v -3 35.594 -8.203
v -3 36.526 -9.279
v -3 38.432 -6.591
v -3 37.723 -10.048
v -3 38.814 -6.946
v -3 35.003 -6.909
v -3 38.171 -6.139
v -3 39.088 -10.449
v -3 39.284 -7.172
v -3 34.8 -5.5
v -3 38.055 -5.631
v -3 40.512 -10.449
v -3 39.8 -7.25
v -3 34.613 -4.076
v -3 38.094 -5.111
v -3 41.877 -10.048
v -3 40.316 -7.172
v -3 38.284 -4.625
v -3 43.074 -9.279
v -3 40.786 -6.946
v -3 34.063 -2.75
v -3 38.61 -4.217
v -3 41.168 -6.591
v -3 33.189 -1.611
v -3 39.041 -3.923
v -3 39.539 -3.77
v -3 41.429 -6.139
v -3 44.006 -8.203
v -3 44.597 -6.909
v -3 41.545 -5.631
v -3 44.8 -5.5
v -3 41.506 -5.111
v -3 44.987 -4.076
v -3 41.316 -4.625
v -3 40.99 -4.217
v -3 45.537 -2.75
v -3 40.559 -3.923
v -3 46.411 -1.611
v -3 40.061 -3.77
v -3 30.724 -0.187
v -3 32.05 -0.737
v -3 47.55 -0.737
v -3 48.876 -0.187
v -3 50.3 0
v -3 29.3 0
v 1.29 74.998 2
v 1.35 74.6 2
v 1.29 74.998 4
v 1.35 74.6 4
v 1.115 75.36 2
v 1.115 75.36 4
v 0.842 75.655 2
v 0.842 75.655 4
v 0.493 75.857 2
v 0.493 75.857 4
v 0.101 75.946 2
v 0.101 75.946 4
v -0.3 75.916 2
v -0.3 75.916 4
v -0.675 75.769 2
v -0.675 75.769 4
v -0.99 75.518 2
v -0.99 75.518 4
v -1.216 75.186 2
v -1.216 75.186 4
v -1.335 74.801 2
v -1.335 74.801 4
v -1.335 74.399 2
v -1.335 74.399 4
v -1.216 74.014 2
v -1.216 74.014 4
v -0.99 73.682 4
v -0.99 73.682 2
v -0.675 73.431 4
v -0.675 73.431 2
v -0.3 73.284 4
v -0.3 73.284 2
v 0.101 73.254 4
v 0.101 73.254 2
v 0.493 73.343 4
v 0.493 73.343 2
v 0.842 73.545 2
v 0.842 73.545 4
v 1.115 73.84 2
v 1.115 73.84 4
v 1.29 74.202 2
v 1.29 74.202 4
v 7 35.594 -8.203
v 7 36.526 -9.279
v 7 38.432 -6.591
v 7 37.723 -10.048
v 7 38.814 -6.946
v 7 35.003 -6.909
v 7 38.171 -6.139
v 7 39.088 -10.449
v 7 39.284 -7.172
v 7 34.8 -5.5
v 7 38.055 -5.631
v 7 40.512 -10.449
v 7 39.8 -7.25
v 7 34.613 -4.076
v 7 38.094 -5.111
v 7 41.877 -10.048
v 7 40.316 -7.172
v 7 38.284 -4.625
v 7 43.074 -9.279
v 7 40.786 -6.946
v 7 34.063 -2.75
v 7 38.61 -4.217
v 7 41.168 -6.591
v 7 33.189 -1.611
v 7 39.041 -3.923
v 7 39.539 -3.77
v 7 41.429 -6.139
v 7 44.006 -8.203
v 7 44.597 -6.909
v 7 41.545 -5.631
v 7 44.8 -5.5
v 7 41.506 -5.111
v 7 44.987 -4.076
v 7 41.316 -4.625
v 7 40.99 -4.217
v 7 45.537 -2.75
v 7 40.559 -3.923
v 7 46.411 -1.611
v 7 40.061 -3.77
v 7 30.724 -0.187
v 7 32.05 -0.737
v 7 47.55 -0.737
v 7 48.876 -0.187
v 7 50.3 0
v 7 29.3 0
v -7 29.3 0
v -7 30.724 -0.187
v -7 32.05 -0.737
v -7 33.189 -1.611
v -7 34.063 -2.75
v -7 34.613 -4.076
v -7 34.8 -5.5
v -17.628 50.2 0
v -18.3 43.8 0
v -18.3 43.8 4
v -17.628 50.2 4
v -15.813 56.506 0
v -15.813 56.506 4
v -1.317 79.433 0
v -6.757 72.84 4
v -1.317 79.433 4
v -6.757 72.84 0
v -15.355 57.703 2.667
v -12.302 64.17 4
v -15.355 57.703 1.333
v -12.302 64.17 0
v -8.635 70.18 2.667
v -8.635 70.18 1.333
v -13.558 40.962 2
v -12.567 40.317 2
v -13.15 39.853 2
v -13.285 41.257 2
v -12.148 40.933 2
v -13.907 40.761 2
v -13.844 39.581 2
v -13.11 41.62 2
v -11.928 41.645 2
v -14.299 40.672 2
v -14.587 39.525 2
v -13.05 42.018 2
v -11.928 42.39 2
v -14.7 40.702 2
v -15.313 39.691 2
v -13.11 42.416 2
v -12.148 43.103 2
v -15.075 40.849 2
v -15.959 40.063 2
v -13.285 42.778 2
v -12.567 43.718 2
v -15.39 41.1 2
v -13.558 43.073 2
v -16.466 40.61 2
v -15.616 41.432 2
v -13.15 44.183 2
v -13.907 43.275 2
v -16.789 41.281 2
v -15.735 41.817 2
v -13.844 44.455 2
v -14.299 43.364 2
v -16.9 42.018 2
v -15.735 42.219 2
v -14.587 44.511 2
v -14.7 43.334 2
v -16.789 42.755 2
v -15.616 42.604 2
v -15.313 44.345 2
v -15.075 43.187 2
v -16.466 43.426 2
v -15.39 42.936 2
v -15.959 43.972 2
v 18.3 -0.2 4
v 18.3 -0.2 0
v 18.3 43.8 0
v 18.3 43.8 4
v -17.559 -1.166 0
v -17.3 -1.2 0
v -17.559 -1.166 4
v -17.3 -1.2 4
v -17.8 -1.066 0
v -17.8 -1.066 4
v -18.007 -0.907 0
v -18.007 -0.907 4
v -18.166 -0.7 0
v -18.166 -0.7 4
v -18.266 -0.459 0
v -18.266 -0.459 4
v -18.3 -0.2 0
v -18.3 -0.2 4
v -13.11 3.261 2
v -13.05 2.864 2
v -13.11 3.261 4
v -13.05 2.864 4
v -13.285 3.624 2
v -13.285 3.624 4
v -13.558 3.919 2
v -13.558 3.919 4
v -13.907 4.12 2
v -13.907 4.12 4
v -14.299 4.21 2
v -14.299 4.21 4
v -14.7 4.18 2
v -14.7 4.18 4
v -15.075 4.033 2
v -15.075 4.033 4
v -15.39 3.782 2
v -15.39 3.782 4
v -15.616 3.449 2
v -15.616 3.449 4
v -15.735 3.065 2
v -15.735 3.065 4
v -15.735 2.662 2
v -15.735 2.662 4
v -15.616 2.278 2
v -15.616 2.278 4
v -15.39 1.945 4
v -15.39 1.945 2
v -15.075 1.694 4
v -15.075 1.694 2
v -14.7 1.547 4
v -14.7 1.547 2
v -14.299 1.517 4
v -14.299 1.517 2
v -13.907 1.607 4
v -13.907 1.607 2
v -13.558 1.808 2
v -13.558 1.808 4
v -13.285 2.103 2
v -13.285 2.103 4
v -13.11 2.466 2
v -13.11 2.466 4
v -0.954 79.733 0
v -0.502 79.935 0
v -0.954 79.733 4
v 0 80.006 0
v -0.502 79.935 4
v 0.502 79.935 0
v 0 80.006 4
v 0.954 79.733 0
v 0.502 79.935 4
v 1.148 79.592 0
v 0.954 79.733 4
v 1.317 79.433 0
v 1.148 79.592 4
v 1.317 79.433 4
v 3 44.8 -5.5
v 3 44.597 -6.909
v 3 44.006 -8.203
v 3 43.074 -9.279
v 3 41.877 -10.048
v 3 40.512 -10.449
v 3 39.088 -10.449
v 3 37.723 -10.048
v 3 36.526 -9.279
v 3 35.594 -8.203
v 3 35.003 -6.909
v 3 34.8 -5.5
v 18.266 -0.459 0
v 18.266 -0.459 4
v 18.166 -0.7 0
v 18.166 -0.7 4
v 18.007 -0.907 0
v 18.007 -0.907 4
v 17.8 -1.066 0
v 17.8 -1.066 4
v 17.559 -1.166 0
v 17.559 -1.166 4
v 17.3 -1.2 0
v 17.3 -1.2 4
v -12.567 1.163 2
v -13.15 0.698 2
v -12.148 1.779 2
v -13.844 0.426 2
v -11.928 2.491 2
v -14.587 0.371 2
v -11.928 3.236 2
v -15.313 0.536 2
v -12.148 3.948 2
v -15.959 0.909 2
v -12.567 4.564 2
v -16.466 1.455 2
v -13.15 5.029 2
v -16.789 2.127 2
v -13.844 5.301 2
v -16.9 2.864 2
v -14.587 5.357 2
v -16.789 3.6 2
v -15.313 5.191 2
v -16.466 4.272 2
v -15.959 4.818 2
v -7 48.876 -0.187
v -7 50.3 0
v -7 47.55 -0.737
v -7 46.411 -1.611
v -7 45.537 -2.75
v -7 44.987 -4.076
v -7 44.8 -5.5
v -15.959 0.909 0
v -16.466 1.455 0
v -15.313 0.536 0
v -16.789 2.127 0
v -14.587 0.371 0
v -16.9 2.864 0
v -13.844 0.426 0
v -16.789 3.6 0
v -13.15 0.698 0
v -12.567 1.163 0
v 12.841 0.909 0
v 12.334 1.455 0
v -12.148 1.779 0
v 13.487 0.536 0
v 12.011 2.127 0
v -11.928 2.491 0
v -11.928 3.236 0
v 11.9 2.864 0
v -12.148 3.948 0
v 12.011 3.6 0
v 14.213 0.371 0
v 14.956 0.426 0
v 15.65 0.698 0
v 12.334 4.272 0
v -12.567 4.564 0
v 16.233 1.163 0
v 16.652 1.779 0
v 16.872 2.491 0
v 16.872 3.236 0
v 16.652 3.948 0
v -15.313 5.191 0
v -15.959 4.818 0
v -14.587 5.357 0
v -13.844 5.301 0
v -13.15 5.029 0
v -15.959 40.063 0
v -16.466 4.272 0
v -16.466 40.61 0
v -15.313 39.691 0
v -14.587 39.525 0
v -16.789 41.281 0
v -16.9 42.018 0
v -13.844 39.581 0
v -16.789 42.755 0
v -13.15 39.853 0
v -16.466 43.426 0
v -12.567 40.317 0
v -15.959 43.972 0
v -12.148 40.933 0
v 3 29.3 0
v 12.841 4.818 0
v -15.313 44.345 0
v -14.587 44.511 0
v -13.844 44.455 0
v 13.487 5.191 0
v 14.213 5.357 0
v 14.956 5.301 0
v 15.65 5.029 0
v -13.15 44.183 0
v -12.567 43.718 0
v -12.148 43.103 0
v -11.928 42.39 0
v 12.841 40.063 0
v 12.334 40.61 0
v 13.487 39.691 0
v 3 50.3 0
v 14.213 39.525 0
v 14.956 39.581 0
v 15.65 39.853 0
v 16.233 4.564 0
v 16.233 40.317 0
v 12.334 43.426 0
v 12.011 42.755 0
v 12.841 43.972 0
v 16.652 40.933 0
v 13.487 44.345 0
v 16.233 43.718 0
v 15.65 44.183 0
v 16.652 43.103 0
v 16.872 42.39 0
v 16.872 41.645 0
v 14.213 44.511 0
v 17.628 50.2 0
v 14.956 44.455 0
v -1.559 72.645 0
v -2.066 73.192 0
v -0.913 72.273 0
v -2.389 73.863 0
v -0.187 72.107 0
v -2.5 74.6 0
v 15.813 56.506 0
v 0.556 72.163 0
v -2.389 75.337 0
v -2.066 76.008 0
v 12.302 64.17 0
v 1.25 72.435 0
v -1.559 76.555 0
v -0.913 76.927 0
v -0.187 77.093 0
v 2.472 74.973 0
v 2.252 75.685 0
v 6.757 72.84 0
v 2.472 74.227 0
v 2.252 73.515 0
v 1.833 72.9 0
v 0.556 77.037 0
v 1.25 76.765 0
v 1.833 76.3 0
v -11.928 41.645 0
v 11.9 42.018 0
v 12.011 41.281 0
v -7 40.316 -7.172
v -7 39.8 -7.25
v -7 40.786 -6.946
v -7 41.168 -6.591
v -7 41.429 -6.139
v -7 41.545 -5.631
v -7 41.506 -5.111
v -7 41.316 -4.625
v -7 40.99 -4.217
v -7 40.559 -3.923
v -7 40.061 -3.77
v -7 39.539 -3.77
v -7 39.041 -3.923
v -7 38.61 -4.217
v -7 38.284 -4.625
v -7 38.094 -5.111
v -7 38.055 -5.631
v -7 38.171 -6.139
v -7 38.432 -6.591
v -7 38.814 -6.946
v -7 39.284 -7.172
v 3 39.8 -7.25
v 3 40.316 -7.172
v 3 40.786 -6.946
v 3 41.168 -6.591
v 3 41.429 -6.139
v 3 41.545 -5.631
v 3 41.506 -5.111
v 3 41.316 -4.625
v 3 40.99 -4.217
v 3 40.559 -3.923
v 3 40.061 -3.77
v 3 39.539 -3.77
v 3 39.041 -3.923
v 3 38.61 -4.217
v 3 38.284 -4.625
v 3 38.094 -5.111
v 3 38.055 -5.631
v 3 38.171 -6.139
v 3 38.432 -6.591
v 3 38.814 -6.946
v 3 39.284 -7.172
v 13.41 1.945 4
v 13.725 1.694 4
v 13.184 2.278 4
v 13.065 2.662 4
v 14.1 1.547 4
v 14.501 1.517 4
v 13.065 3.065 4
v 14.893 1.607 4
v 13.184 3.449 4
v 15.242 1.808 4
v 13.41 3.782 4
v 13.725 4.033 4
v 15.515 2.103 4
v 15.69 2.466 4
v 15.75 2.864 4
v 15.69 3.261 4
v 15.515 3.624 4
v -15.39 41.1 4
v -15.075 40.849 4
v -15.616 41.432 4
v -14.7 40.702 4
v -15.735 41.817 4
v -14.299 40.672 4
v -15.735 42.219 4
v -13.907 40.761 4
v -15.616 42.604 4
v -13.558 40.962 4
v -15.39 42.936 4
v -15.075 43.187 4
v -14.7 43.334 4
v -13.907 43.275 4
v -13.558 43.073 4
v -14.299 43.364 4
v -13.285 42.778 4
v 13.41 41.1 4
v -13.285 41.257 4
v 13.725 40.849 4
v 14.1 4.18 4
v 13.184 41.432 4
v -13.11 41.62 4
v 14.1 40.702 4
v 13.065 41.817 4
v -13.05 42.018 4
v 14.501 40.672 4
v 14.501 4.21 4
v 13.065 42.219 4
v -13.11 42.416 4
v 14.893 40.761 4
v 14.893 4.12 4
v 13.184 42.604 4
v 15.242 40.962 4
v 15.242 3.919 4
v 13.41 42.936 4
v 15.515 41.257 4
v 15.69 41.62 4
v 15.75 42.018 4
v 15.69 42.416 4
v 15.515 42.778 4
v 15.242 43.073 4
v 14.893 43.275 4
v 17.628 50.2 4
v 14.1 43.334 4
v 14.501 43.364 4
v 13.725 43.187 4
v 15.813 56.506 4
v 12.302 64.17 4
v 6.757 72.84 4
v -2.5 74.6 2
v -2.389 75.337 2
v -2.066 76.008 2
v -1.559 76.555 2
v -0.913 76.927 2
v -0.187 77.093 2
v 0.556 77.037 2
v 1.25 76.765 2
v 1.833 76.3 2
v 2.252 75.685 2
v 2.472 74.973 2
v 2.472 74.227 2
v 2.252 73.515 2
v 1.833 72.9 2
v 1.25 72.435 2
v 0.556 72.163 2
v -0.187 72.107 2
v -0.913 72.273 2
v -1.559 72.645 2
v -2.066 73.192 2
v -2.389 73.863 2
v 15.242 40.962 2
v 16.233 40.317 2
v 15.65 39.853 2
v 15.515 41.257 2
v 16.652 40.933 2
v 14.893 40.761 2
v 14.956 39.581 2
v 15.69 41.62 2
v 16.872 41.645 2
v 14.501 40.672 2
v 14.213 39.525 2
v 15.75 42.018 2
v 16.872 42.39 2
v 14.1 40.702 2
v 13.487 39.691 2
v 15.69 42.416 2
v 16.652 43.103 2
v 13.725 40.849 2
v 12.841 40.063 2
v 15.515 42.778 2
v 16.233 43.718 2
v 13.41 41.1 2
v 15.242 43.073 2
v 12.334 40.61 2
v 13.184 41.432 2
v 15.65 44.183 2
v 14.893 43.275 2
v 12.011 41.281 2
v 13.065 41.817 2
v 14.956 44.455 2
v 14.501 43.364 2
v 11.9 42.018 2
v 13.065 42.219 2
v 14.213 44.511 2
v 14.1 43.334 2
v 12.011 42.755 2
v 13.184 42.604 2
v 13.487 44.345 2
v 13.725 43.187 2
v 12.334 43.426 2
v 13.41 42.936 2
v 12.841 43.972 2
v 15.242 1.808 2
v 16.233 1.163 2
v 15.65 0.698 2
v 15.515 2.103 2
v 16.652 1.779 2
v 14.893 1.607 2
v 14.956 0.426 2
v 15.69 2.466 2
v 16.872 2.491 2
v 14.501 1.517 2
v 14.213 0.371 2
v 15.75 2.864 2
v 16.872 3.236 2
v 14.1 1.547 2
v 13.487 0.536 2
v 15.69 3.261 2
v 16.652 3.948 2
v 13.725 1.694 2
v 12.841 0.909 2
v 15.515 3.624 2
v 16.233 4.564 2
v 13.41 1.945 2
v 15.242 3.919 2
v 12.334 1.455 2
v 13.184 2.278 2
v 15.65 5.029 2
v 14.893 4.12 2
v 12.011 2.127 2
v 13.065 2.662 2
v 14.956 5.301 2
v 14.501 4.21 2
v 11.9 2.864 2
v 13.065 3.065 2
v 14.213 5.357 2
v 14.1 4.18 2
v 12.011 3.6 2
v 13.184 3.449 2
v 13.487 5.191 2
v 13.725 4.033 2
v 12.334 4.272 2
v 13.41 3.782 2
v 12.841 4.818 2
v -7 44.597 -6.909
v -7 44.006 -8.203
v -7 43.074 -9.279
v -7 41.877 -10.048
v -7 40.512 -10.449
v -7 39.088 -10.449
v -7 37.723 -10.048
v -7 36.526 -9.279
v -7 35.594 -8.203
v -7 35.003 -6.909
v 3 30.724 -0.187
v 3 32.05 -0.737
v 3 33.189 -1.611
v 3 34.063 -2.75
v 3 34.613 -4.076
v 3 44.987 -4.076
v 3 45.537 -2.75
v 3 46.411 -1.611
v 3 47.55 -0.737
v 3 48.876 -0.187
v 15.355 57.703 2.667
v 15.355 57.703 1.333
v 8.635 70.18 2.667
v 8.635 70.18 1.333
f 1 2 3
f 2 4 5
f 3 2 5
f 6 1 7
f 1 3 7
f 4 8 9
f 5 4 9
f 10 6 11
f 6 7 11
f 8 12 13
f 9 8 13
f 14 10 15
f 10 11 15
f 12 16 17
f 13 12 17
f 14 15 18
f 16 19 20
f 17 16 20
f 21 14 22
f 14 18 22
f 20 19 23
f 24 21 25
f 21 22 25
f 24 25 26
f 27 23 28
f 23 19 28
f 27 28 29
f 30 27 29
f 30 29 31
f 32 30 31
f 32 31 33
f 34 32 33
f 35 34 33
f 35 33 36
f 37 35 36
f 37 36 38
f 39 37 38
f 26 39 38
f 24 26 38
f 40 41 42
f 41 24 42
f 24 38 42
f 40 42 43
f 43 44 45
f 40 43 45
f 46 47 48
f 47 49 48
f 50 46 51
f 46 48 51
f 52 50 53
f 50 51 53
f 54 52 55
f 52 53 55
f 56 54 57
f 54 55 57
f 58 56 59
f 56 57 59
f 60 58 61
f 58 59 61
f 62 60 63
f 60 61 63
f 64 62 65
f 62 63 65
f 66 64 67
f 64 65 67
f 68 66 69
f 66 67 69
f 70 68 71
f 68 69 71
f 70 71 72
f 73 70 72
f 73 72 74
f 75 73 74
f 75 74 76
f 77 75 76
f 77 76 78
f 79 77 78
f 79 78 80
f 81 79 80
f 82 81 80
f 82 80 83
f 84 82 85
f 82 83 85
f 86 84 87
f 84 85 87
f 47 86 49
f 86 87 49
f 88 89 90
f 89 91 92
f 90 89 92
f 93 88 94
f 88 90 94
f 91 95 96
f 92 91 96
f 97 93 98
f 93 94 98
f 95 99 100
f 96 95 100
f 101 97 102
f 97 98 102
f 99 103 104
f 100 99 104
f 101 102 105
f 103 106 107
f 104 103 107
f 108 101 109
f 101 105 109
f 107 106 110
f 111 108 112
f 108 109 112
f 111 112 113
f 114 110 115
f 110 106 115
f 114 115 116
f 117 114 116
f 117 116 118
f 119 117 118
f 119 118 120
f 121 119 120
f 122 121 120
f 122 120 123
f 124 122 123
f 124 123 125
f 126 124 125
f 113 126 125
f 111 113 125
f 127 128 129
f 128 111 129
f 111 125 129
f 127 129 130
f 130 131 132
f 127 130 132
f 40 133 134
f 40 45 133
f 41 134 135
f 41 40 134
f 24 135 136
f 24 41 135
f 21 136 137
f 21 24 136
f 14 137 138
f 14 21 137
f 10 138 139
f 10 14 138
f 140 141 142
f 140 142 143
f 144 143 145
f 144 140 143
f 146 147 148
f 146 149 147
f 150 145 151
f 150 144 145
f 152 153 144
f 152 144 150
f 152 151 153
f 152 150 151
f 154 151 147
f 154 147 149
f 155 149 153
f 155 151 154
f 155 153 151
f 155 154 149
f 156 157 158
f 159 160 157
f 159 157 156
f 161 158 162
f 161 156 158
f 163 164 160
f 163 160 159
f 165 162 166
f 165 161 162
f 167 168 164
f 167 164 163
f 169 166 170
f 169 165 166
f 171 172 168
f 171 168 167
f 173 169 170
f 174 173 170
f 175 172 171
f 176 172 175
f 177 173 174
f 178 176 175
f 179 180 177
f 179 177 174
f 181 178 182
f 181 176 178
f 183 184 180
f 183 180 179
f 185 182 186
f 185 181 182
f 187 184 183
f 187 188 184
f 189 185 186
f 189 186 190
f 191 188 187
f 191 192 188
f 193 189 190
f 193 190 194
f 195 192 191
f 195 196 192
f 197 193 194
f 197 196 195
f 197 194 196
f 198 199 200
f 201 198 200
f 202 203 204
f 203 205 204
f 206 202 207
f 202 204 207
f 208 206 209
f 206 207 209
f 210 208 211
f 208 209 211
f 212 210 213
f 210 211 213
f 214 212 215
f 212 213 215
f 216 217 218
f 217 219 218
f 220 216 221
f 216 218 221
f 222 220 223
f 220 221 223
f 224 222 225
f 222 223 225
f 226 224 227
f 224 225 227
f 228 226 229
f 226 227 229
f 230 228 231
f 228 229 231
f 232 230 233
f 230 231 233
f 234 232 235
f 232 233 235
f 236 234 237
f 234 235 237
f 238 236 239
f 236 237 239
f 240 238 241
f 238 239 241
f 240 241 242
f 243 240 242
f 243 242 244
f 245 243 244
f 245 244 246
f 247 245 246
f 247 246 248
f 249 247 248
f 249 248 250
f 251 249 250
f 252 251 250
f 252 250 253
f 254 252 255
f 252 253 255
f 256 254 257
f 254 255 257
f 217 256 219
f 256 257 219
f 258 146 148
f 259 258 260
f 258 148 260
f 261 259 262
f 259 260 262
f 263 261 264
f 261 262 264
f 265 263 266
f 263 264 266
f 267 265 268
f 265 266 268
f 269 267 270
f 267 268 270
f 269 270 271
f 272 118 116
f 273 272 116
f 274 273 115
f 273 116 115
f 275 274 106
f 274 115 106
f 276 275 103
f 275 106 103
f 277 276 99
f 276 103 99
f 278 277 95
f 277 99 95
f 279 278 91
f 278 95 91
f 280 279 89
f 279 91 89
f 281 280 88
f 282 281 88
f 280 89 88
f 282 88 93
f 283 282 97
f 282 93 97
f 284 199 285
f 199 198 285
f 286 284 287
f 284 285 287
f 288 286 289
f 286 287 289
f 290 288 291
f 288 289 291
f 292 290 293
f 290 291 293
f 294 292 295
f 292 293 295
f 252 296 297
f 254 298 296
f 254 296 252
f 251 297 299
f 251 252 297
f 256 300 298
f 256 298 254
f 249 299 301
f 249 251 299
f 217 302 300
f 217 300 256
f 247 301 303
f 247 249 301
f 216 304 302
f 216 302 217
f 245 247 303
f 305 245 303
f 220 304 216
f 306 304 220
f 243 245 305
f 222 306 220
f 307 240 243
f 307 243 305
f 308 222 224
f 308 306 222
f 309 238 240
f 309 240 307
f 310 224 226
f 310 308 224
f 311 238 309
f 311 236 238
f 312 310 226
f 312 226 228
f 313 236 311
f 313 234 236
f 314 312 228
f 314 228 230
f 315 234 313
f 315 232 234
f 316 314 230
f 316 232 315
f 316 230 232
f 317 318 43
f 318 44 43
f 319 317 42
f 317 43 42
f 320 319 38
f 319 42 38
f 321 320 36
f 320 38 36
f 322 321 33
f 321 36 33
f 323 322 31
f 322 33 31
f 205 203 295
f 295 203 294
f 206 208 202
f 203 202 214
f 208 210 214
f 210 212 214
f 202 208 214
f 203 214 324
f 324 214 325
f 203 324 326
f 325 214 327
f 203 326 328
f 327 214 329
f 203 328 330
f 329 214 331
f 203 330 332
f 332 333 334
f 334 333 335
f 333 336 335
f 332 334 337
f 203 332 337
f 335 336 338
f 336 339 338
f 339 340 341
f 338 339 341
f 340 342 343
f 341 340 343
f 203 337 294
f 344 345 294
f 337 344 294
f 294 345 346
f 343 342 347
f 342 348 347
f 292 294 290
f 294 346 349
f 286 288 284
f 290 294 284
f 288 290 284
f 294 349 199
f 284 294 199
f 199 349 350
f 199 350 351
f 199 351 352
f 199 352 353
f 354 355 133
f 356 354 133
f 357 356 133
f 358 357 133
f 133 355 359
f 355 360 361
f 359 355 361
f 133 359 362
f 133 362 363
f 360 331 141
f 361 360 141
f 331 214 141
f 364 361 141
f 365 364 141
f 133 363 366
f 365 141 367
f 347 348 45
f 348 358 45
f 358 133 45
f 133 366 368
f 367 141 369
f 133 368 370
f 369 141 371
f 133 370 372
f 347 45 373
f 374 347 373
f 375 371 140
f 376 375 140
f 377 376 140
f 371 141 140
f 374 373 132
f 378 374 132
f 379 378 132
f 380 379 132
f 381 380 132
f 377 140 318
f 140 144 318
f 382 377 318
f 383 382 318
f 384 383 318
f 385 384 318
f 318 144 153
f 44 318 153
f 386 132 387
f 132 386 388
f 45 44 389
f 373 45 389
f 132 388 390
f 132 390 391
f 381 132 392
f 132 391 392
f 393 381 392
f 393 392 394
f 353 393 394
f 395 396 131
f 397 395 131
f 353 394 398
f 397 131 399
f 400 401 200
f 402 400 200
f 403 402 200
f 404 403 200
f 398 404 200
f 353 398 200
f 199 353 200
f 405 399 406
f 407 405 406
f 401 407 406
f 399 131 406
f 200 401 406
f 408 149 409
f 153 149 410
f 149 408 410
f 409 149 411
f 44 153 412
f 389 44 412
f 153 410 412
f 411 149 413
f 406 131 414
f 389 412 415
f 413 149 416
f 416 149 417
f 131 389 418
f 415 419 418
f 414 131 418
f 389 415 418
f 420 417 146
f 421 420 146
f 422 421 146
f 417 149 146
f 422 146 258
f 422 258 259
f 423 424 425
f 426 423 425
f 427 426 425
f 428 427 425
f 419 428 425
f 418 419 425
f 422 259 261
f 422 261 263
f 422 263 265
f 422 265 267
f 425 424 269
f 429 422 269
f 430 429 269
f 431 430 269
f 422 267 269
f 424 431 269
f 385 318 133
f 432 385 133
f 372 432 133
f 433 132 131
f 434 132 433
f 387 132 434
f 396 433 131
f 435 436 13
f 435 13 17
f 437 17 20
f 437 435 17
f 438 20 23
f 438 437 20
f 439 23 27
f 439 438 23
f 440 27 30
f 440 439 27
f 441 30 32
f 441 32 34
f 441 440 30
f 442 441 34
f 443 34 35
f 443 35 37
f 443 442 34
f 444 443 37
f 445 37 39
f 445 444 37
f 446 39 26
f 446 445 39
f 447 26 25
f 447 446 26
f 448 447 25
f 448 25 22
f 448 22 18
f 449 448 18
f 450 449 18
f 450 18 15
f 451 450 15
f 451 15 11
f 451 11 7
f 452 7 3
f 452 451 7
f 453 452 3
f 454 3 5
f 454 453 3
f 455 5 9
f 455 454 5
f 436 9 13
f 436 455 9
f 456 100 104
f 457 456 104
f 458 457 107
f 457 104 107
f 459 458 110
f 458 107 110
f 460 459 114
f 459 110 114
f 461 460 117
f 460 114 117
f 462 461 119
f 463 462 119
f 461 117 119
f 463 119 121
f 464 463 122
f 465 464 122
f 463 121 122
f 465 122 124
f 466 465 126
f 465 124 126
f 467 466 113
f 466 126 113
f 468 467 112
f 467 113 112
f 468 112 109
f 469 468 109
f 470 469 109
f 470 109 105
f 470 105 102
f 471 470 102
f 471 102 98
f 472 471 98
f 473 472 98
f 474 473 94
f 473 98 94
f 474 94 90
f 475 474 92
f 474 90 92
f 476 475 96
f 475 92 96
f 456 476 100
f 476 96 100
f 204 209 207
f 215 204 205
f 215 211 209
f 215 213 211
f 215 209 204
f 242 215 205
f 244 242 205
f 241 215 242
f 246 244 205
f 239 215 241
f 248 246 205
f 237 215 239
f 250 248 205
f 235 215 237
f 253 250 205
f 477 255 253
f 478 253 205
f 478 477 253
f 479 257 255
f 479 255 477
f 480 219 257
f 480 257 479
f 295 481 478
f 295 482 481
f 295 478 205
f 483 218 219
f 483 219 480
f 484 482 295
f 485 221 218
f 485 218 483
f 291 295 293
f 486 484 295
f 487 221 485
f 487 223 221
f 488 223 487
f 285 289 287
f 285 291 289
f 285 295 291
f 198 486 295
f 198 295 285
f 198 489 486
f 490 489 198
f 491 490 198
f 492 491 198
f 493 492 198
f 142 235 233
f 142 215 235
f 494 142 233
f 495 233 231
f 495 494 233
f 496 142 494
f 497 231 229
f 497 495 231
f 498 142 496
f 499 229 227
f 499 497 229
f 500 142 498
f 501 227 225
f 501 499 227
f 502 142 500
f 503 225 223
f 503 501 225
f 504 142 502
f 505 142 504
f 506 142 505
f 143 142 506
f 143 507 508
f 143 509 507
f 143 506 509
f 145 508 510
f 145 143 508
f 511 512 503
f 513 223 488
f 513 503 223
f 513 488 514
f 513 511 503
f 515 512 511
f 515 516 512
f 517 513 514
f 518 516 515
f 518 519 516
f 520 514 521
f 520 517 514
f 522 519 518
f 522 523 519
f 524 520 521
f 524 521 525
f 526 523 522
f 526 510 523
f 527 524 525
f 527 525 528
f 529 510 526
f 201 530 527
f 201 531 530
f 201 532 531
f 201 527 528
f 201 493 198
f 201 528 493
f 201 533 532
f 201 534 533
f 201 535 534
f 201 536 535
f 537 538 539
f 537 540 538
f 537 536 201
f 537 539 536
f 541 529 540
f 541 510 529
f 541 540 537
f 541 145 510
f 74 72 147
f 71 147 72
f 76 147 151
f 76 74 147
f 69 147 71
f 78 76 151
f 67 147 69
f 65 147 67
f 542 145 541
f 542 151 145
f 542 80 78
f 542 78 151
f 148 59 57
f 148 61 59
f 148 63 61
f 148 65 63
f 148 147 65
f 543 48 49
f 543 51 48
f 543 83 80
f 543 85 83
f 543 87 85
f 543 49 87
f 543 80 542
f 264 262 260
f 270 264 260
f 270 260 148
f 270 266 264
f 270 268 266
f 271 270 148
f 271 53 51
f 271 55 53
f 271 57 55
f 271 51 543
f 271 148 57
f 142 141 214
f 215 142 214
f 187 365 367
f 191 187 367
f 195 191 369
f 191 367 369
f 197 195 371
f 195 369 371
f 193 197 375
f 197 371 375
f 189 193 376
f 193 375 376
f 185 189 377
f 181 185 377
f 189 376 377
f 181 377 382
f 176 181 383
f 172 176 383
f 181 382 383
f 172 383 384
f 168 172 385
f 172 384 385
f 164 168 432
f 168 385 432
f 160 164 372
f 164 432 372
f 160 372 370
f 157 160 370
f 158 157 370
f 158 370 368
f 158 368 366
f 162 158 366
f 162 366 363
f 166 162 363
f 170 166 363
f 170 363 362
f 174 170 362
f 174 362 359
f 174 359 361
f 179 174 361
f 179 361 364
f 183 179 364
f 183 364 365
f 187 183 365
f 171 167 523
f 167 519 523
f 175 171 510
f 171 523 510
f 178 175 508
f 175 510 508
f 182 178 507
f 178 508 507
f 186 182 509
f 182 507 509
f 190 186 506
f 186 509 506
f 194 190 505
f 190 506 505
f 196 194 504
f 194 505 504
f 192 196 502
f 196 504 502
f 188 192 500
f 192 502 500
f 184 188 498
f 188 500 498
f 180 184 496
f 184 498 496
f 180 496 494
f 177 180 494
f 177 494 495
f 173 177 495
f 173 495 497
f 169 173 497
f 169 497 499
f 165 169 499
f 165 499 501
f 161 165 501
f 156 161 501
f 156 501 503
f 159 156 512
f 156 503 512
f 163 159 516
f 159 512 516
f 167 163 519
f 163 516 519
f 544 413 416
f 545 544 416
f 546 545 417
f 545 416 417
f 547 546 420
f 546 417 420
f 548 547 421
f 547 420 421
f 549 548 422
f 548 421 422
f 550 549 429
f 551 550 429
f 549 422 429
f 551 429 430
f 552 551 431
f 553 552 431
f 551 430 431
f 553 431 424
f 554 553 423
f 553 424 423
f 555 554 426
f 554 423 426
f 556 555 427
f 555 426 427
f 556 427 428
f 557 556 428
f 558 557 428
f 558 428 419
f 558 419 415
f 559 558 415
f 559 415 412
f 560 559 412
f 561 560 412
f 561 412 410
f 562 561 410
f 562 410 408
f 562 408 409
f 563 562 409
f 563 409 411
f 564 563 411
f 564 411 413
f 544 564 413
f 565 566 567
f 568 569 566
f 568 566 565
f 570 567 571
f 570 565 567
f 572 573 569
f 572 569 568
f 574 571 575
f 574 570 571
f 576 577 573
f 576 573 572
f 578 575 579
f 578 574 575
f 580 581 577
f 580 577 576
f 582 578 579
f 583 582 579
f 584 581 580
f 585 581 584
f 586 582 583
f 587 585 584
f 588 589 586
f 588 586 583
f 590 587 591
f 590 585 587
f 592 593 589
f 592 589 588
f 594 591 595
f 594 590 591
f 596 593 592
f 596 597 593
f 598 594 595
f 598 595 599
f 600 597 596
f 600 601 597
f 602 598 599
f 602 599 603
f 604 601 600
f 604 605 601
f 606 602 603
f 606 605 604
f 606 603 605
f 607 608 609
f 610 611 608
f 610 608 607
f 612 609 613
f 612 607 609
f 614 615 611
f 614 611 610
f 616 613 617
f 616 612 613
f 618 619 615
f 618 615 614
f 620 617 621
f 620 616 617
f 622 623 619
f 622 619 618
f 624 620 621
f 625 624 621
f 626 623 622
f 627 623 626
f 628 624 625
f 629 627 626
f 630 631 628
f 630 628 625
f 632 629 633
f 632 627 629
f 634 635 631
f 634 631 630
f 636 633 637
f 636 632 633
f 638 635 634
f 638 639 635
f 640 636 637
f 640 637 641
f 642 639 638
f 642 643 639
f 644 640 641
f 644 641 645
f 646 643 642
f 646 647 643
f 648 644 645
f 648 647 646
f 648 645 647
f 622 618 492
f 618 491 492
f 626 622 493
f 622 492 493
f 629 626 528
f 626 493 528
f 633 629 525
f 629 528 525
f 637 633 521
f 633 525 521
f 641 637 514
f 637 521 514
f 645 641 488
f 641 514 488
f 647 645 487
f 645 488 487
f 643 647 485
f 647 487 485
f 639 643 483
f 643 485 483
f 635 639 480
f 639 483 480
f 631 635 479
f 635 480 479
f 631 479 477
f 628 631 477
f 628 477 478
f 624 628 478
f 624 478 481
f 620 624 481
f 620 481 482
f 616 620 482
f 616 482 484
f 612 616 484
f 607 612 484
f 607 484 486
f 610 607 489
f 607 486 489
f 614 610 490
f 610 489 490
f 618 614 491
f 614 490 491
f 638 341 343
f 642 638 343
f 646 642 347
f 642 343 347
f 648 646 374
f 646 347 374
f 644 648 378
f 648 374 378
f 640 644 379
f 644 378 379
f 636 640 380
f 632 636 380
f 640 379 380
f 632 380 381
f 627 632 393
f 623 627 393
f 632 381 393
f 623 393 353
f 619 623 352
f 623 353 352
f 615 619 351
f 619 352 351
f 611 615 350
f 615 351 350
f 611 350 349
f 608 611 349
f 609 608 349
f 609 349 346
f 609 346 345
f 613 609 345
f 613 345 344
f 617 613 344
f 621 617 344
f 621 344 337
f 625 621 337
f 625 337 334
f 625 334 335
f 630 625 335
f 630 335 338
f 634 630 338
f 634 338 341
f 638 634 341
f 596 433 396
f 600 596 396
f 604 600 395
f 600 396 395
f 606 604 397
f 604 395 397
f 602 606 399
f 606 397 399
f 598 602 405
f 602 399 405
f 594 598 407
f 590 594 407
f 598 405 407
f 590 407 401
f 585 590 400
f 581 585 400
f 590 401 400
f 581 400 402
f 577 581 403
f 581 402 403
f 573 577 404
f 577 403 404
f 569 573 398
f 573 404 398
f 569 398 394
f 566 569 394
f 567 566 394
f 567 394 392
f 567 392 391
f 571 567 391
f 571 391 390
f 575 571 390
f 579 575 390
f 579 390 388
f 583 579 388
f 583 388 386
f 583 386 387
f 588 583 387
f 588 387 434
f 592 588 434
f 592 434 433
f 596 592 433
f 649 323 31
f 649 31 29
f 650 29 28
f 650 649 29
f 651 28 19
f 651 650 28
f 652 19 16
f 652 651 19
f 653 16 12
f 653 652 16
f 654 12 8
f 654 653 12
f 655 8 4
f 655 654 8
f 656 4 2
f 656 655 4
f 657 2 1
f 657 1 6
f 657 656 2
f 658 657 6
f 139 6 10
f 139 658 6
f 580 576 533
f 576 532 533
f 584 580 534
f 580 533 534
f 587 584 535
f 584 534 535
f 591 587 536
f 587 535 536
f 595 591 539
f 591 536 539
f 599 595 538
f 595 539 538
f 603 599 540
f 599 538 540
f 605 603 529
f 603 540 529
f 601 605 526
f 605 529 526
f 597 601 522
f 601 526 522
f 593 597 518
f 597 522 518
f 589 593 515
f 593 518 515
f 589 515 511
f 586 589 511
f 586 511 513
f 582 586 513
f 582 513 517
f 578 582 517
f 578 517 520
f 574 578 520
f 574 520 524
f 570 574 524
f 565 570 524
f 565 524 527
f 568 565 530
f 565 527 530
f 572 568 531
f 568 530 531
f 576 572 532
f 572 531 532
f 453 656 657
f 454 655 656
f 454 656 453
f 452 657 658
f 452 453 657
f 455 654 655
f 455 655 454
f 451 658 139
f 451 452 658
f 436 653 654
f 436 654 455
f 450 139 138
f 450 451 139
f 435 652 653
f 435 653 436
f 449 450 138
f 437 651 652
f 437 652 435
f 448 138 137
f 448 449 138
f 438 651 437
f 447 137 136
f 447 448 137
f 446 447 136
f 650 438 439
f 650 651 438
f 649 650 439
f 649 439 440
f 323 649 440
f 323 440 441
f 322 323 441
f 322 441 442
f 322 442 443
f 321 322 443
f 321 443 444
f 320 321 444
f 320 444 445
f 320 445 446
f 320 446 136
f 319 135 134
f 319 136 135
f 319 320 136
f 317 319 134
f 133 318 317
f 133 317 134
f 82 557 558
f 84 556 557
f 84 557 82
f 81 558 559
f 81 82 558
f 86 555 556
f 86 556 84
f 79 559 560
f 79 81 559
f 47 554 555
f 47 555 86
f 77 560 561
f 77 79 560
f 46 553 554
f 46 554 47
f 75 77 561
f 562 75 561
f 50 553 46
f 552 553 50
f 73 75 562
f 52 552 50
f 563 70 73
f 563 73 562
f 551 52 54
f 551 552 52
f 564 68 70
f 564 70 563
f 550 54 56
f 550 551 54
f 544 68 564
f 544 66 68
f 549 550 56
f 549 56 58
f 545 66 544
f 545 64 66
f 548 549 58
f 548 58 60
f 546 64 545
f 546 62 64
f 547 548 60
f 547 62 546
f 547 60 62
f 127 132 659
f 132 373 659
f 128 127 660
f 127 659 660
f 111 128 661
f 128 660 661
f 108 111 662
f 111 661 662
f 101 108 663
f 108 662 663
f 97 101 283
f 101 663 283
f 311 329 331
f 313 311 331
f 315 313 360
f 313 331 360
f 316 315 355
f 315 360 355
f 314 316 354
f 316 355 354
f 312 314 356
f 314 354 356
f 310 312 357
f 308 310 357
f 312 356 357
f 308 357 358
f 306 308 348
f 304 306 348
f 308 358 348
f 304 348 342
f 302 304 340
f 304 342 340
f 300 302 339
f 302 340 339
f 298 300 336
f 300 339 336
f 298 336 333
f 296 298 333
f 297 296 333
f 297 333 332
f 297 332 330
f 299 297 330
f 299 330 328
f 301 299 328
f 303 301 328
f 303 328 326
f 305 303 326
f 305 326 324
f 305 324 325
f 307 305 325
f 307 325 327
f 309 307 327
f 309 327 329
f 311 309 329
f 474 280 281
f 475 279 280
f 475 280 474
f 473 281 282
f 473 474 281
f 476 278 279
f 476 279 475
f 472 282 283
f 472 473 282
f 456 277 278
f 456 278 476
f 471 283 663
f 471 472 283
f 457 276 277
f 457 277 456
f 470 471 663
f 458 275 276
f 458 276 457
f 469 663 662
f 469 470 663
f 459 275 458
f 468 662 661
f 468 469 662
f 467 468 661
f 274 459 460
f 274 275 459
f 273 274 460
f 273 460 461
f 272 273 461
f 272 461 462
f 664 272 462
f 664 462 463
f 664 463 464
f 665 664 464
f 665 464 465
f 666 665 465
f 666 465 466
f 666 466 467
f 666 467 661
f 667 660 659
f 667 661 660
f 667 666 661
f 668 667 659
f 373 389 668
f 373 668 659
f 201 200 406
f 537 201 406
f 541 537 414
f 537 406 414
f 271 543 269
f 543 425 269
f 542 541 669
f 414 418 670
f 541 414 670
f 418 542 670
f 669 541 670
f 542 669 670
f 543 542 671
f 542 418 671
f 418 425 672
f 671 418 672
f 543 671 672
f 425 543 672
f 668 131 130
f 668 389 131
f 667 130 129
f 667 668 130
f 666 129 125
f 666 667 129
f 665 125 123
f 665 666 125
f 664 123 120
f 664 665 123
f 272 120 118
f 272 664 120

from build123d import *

# Parameters (mm, degrees)
BOSS_EXTRUDE1_DEPTH                     = 4
CBORE_FOR_M5_HEX_HEAD_BOLT1_D           = 2.7
CBORE_FOR_M5_HEX_HEAD_BOLT1_CBORE_D     = 5
CBORE_FOR_M5_HEX_HEAD_BOLT1_CBORE_DEPTH = 2
SKETCH6_R                               = 1.75
BOSS_EXTRUDE2_DEPTH                     = 4
FILLET1_R                               = 5.5
FILLET1_OF_MIRROR1_R                    = 5.5
FILLET2_R                               = 1.8
FILLET3_R                               = 1


with BuildPart() as part:
    # Sketch2 → Boss-Extrude1 (new body)
    with BuildSketch(Plane.XY):
        with BuildLine():
            Line((-18.3, -1.2), (18.3, -1.2))
            Line((18.3, -1.2), (18.3, 43.8))
            add(Edge.make_bspline(
                [(18.3, 43.8), (18.3, 58.8), (6.363961031, 74.436038969), (0, 80.8)],
                knots=[0, 0, 0, 0, 1, 1, 1, 1], degree=3))
            add(Edge.make_bspline(
                [(-18.3, 43.8), (-18.3, 58.8), (-6.363961031, 74.436038969), (0, 80.8)],
                knots=[0, 0, 0, 0, 1, 1, 1, 1], degree=3))
            Line((-18.3, 43.8), (-18.3, -1.2))
        make_face()
    extrude(amount=BOSS_EXTRUDE1_DEPTH)

    # CBORE for M5 Hex Head Bolt1 (through all)
    with Locations(Plane(origin=(0, 0, 0), x_dir=(-1, 0, 0), z_dir=(0, 0, -1))):
        with Locations((14.4, 42.017834424), (14.4, 2.863521172), (-14.4, 2.863521172), (-14.4, 42.017834424), (0, 74.6)):
            CounterBoreHole(CBORE_FOR_M5_HEX_HEAD_BOLT1_D / 2, CBORE_FOR_M5_HEX_HEAD_BOLT1_CBORE_D / 2, CBORE_FOR_M5_HEX_HEAD_BOLT1_CBORE_DEPTH)

    # Sketch6 → Boss-Extrude2 (add)
    with BuildSketch(Plane(origin=(7, 0, 0), x_dir=(0, 0, -1), z_dir=(1, 0, 0))):
        with BuildLine():
            Line((0, 44.8), (5.5, 44.8))
            ThreePointArc((5.5, 44.8), (10.5, 39.8), (5.5, 34.8))
            Line((5.5, 34.8), (0, 34.8))
            Line((0, 34.8), (0, 44.8))
        make_face()
        with Locations((5.5, 39.8)):
            Circle(SKETCH6_R, mode=Mode.SUBTRACT)
    boss_extrude2 = extrude(amount=-BOSS_EXTRUDE2_DEPTH)

    # Fillet1
    fillet1_edges = [part.edges().sort_by_distance(p)[0] for p in [
        (5, 34.8, 0),
        (5, 44.8, 0),
    ]]
    fillet(fillet1_edges, radius=FILLET1_R - 0.0001)  # a hair under: the kernel refuses the full size

    # Mirror1: Boss-Extrude2 across plane
    add(boss_extrude2.mirror(Plane(origin=(0, 0, 0), x_dir=(0, 0, 1), z_dir=(1, 0, 0))))

    # Fillet1 of Mirror1
    fillet1_of_mirror1_edges = [part.edges().sort_by_distance(p)[0] for p in [
        (-5, 34.8, 0),
        (-5, 44.8, 0),
    ]]
    fillet(fillet1_of_mirror1_edges, radius=FILLET1_OF_MIRROR1_R - 0.0001)  # a hair under: the kernel refuses the full size

    # Fillet2
    fillet2_edges = [part.edges().sort_by_distance(p)[0] for p in [
        (0, 80.8, 2),
    ]]
    fillet(fillet2_edges, radius=FILLET2_R)

    # Fillet3
    fillet3_edges = [part.edges().sort_by_distance(p)[0] for p in [
        (18.3, -1.2, 2),
        (-18.3, -1.2, 2),
    ]]
    fillet(fillet3_edges, radius=FILLET3_R)


solid = part.part
